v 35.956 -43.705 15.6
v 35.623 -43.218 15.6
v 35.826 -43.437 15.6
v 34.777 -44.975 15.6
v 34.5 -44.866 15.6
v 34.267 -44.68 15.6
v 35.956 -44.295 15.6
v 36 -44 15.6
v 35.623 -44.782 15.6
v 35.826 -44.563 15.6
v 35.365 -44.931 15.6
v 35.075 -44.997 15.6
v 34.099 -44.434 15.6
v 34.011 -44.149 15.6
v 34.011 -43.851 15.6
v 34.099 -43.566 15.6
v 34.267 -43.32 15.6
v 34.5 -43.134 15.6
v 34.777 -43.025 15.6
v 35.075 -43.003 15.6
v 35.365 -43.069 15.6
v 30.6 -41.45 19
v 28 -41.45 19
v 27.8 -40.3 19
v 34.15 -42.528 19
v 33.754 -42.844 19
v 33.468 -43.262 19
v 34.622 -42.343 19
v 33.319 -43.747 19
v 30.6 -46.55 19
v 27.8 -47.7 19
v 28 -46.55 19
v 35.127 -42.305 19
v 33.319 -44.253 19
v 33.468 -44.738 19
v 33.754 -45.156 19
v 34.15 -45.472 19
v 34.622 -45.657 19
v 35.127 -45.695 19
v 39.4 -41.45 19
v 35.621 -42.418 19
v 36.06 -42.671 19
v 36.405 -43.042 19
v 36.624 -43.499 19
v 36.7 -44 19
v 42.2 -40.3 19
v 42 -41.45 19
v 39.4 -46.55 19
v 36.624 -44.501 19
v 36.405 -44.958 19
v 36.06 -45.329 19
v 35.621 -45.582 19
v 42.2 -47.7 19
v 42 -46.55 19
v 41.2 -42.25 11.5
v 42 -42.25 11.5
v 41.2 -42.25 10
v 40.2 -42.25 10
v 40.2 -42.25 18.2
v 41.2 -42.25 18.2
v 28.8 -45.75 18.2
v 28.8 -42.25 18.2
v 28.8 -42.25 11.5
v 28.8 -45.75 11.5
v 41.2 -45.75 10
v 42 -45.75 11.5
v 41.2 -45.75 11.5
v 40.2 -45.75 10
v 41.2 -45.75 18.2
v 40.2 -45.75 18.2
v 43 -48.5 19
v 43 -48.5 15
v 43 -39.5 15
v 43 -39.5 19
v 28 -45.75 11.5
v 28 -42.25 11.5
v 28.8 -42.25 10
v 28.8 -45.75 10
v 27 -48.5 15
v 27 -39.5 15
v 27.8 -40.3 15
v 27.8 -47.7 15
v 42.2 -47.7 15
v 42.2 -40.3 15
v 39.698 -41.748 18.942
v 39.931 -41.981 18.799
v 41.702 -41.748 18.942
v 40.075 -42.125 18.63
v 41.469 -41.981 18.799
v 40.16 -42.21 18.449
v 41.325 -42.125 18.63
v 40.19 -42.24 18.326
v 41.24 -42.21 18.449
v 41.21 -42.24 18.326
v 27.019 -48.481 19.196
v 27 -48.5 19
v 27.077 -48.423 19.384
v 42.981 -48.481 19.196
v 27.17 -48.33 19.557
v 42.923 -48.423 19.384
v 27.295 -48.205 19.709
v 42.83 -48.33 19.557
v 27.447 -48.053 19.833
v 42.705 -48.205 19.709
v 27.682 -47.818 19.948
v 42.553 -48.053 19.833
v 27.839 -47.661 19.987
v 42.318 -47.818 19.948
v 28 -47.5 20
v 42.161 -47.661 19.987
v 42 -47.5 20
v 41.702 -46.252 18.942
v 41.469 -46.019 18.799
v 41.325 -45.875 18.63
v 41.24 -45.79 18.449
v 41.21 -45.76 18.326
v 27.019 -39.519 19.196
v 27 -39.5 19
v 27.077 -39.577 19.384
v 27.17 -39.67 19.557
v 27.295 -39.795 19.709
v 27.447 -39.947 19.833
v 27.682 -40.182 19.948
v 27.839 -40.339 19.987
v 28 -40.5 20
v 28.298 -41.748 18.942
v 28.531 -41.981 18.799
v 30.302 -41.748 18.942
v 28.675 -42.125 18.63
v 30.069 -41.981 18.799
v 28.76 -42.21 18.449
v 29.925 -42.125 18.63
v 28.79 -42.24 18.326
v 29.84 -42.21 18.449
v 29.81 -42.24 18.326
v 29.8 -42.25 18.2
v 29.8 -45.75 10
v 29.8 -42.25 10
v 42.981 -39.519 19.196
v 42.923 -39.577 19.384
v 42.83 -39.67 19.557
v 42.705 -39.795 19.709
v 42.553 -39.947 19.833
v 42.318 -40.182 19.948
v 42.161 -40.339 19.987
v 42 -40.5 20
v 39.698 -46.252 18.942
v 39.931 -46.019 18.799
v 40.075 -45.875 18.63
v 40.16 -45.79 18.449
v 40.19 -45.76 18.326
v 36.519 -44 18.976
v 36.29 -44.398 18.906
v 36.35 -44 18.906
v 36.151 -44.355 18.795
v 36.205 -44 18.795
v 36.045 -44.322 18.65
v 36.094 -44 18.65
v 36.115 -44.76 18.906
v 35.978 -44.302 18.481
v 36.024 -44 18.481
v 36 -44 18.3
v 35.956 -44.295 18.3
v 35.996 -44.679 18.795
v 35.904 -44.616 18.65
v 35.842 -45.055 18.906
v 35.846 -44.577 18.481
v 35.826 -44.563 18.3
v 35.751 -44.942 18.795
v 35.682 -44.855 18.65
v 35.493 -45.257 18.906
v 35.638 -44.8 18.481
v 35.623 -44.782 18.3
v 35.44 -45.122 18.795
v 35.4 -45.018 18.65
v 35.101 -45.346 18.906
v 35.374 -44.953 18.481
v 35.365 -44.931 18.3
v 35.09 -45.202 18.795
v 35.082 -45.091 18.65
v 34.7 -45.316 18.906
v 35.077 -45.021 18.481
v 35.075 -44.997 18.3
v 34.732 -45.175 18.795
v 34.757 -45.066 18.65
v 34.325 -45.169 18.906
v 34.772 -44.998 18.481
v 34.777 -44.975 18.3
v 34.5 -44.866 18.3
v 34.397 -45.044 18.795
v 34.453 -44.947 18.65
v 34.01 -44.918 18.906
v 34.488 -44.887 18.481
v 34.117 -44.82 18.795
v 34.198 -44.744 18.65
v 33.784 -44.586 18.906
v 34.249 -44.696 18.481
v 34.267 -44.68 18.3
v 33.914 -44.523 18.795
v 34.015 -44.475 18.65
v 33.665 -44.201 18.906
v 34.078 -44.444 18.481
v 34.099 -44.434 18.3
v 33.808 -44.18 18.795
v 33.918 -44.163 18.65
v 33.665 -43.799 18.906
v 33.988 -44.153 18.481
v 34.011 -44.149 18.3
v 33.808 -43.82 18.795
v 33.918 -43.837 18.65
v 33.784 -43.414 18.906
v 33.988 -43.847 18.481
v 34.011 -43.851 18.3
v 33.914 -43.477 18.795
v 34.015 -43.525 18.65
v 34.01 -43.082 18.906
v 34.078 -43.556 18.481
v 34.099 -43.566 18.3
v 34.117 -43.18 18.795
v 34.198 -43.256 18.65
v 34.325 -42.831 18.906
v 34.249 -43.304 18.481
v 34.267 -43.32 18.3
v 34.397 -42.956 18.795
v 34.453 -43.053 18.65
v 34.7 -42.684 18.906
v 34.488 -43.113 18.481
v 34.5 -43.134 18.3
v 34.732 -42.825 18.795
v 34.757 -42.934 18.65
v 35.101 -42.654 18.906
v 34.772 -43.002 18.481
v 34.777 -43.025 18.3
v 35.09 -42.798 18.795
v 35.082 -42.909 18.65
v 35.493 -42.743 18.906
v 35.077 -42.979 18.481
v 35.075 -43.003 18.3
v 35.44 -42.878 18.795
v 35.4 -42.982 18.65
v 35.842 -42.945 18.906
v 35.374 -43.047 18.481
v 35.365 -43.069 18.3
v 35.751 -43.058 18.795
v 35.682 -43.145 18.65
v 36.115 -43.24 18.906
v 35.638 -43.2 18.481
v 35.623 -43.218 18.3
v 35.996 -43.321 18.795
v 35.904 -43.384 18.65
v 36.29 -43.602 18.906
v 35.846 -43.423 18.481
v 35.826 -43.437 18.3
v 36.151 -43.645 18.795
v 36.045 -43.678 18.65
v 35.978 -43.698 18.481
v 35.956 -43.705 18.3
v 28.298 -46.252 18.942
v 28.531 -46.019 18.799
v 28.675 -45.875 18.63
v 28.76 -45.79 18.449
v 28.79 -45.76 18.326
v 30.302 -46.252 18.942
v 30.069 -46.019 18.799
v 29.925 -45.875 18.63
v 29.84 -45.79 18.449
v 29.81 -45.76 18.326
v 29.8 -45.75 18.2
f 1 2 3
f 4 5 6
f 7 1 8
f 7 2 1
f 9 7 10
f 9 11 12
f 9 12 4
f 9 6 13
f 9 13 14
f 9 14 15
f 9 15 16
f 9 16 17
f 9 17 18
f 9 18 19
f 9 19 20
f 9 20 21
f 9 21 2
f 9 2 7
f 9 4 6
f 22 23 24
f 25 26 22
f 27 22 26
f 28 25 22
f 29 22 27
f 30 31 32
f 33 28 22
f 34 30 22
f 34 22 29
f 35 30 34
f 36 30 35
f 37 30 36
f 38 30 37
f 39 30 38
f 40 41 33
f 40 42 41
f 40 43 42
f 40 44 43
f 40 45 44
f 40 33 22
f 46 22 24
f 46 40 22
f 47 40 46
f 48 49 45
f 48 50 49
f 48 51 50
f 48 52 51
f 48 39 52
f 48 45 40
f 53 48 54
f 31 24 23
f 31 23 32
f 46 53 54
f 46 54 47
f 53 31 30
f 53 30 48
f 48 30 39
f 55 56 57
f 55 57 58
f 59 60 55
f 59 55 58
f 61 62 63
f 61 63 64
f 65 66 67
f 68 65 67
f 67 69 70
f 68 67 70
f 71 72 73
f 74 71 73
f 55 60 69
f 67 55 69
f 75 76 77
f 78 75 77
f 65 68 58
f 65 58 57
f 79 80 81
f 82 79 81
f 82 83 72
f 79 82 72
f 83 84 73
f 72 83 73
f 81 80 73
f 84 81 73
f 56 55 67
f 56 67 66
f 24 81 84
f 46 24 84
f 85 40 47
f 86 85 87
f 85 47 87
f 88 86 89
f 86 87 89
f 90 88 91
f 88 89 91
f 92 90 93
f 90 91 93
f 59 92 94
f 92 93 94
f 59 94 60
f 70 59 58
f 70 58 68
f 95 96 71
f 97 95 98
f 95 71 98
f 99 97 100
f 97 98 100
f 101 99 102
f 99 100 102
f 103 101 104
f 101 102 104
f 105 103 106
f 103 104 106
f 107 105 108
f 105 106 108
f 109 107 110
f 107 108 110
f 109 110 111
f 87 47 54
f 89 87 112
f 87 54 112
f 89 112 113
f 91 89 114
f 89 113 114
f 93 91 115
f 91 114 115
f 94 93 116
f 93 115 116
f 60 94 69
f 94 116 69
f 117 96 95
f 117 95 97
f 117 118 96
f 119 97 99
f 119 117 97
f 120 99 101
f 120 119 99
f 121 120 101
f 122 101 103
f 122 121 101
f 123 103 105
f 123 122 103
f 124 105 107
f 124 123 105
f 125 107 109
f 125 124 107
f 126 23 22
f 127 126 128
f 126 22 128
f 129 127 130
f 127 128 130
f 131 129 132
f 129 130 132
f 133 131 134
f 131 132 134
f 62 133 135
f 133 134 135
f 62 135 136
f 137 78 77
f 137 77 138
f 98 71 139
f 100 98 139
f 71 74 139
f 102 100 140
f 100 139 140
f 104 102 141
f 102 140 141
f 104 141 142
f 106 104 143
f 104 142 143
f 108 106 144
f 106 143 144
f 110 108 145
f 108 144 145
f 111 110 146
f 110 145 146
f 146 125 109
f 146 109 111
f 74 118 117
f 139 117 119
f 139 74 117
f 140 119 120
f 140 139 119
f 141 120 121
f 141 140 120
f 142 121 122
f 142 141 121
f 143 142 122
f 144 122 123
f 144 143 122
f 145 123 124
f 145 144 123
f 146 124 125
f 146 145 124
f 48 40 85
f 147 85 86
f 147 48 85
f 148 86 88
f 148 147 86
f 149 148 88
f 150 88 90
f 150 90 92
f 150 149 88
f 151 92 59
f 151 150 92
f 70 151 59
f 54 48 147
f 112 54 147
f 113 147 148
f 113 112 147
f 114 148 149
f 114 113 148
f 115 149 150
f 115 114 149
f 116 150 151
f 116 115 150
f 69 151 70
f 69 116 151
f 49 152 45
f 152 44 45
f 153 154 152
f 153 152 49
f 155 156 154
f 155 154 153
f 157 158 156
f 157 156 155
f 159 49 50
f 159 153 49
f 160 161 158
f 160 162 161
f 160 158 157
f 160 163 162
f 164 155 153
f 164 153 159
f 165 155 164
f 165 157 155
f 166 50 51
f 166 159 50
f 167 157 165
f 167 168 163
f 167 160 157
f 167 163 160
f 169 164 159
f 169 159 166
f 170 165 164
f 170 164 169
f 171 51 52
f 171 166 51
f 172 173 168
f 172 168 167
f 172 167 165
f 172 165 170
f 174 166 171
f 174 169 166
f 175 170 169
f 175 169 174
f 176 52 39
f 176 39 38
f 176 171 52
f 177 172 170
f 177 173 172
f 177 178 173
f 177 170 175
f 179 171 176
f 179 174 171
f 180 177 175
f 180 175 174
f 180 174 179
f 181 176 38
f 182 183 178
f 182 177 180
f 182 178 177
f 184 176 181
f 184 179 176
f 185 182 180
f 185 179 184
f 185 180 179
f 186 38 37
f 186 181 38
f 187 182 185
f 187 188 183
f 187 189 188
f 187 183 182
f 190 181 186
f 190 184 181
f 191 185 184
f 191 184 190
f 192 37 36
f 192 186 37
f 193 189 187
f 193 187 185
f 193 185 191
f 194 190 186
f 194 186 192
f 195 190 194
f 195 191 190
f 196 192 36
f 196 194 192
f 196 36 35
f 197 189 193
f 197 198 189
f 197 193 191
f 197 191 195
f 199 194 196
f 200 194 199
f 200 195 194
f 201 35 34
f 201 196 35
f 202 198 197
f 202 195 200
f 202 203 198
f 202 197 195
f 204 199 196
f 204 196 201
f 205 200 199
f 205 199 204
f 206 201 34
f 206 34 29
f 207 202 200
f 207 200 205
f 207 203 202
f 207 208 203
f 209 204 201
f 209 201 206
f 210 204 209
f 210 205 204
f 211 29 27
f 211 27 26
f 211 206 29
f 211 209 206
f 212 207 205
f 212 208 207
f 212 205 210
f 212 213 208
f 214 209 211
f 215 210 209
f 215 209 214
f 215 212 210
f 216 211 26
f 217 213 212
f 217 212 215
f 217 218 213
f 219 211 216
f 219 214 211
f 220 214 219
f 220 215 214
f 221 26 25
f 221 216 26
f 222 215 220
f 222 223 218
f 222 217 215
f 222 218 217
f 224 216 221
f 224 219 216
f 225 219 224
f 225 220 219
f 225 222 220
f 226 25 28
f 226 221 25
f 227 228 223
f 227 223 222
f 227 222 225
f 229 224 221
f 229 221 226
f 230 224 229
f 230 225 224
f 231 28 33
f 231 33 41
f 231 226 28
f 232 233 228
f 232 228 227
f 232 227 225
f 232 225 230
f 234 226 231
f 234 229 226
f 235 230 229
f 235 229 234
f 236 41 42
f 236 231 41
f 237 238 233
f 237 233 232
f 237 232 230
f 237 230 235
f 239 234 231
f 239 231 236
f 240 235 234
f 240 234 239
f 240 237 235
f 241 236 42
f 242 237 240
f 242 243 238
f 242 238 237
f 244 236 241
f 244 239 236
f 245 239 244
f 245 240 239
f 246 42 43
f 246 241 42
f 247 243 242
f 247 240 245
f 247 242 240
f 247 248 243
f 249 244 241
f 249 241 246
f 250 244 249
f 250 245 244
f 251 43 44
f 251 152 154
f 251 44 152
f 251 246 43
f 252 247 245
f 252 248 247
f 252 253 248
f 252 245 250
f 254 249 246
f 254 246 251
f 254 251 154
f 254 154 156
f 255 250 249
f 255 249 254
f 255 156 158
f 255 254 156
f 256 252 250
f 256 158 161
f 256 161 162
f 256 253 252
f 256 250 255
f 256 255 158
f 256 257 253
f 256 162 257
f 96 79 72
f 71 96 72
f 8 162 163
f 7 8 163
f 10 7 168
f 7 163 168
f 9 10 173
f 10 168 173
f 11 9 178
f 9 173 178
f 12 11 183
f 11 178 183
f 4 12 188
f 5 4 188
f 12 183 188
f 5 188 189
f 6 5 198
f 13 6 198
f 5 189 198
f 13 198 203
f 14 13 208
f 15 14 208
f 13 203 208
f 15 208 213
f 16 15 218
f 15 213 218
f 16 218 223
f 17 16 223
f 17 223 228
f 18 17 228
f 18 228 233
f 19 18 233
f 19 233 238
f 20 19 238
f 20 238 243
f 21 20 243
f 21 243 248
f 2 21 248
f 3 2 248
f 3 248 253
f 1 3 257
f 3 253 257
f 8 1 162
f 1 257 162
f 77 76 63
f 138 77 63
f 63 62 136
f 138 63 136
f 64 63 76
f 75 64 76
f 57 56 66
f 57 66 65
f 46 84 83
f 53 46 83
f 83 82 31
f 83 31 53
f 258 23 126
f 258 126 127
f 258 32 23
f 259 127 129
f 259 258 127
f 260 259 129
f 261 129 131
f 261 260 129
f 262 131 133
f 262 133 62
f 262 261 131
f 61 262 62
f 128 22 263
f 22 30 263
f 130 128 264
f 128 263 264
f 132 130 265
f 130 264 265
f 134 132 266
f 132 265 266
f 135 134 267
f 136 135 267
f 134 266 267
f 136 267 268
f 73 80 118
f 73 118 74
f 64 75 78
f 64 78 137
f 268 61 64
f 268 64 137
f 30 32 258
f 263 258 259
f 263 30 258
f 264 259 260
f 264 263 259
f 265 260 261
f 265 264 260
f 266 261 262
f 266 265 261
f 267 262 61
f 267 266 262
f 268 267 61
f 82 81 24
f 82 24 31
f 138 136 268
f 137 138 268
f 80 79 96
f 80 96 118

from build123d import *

# Parameters (mm, degrees)
SKETCH036_W     = 16
SKETCH036_H     = 9
PAD021_DEPTH    = 5
SKETCH037_W     = 14.4
SKETCH037_H     = 7.4
POCKET013_DEPTH = 4
SKETCH038_W     = 1
SKETCH038_H     = 3.5
PAD022_DEPTH    = 9
PAD023_DEPTH    = 3.5
SKETCH041_R     = 1
PAD025_DEPTH    = 3.4
FILLET002_R     = 1
FILLET007_R     = 0.7
FILLET011_R     = 0.8


with BuildPart() as part:
    # Sketch036 → Pad021 (new body)
    with BuildSketch(Plane.XY):
        Rectangle(SKETCH036_W, SKETCH036_H)
    extrude(amount=PAD021_DEPTH)

    # Sketch037 (on Face5 of Pad021) → Pocket013 (cut)
    with BuildSketch(Plane(origin=(0, 0, 0), x_dir=(1, 0, 0), z_dir=(0, 0, -1))):
        Rectangle(SKETCH037_W, SKETCH037_H)
    extrude(amount=-POCKET013_DEPTH, mode=Mode.SUBTRACT)

    # Sketch038 (on Face11 of Pocket013) → Pad022 (join)
    with BuildSketch(Plane(origin=(0, 0, 4), x_dir=(1, 0, 0), z_dir=(0, 0, -1))):
        with Locations((-5.7, 0)):
            Rectangle(SKETCH038_W, SKETCH038_H)
        with Locations((5.7, 0)):
            Rectangle(SKETCH038_W, SKETCH038_H)
    extrude(amount=PAD022_DEPTH)

    # Sketch039 (on Face17 of Pad022) → Pad023 (join)
    with BuildSketch(Plane(origin=(0, 1.75, 0), x_dir=(-1, 0, 0), z_dir=(0, 1, 0))):
        Polygon((-6.2, -3.5), (-7, -3.5), (-6.2, -5), align=None)
        Polygon((6.2, -3.5), (7, -3.5), (6.2, -5), align=None)
    extrude(amount=-PAD023_DEPTH)

    # Sketch041 (on Face11 of Pad023) → Pad025 (join)
    with BuildSketch(Plane(origin=(0, 0, 4), x_dir=(1, 0, 0), z_dir=(0, 0, -1))):
        Circle(SKETCH041_R)
    extrude(amount=PAD025_DEPTH)

    # Fillet002
    fillet002_edges = [part.edges().sort_by_distance(p)[0] for p in [
        (0, 4.5, 5),
        (-8, 0, 5),
        (0, -4.5, 5),
        (8, 0, 5),
    ]]
    fillet(fillet002_edges, radius=FILLET002_R)

    # Fillet007
    fillet007_edges = [part.edges().sort_by_distance(p)[0] for p in [
        (-1, 0, 4),
    ]]
    fillet(fillet007_edges, radius=FILLET007_R)

    # Fillet011
    fillet011_edges = [part.edges().sort_by_distance(p)[0] for p in [
        (5.2, 0, 4),
        (5.7, 1.75, 4),
        (6.2, 0, 4),
        (5.7, -1.75, 4),
        (-5.7, -1.75, 4),
        (-6.2, 0, 4),
        (-5.2, 0, 4),
        (-5.7, 1.75, 4),
    ]]
    fillet(fillet011_edges, radius=FILLET011_R)


with BuildPart() as part_1:
    # Body008 placement: moved
    add(part.part.moved(Location((-33, -44, 15))))


with BuildPart() as part_2:
    # Clone003 placement: moved
    add(part_1.part.moved(Location((0, 0, 4))))


with BuildPart() as part_3:
    # Body012 placement: moved
    add(part_2.part.moved(Location((68, 0, -4))))


solid = part_3.part
